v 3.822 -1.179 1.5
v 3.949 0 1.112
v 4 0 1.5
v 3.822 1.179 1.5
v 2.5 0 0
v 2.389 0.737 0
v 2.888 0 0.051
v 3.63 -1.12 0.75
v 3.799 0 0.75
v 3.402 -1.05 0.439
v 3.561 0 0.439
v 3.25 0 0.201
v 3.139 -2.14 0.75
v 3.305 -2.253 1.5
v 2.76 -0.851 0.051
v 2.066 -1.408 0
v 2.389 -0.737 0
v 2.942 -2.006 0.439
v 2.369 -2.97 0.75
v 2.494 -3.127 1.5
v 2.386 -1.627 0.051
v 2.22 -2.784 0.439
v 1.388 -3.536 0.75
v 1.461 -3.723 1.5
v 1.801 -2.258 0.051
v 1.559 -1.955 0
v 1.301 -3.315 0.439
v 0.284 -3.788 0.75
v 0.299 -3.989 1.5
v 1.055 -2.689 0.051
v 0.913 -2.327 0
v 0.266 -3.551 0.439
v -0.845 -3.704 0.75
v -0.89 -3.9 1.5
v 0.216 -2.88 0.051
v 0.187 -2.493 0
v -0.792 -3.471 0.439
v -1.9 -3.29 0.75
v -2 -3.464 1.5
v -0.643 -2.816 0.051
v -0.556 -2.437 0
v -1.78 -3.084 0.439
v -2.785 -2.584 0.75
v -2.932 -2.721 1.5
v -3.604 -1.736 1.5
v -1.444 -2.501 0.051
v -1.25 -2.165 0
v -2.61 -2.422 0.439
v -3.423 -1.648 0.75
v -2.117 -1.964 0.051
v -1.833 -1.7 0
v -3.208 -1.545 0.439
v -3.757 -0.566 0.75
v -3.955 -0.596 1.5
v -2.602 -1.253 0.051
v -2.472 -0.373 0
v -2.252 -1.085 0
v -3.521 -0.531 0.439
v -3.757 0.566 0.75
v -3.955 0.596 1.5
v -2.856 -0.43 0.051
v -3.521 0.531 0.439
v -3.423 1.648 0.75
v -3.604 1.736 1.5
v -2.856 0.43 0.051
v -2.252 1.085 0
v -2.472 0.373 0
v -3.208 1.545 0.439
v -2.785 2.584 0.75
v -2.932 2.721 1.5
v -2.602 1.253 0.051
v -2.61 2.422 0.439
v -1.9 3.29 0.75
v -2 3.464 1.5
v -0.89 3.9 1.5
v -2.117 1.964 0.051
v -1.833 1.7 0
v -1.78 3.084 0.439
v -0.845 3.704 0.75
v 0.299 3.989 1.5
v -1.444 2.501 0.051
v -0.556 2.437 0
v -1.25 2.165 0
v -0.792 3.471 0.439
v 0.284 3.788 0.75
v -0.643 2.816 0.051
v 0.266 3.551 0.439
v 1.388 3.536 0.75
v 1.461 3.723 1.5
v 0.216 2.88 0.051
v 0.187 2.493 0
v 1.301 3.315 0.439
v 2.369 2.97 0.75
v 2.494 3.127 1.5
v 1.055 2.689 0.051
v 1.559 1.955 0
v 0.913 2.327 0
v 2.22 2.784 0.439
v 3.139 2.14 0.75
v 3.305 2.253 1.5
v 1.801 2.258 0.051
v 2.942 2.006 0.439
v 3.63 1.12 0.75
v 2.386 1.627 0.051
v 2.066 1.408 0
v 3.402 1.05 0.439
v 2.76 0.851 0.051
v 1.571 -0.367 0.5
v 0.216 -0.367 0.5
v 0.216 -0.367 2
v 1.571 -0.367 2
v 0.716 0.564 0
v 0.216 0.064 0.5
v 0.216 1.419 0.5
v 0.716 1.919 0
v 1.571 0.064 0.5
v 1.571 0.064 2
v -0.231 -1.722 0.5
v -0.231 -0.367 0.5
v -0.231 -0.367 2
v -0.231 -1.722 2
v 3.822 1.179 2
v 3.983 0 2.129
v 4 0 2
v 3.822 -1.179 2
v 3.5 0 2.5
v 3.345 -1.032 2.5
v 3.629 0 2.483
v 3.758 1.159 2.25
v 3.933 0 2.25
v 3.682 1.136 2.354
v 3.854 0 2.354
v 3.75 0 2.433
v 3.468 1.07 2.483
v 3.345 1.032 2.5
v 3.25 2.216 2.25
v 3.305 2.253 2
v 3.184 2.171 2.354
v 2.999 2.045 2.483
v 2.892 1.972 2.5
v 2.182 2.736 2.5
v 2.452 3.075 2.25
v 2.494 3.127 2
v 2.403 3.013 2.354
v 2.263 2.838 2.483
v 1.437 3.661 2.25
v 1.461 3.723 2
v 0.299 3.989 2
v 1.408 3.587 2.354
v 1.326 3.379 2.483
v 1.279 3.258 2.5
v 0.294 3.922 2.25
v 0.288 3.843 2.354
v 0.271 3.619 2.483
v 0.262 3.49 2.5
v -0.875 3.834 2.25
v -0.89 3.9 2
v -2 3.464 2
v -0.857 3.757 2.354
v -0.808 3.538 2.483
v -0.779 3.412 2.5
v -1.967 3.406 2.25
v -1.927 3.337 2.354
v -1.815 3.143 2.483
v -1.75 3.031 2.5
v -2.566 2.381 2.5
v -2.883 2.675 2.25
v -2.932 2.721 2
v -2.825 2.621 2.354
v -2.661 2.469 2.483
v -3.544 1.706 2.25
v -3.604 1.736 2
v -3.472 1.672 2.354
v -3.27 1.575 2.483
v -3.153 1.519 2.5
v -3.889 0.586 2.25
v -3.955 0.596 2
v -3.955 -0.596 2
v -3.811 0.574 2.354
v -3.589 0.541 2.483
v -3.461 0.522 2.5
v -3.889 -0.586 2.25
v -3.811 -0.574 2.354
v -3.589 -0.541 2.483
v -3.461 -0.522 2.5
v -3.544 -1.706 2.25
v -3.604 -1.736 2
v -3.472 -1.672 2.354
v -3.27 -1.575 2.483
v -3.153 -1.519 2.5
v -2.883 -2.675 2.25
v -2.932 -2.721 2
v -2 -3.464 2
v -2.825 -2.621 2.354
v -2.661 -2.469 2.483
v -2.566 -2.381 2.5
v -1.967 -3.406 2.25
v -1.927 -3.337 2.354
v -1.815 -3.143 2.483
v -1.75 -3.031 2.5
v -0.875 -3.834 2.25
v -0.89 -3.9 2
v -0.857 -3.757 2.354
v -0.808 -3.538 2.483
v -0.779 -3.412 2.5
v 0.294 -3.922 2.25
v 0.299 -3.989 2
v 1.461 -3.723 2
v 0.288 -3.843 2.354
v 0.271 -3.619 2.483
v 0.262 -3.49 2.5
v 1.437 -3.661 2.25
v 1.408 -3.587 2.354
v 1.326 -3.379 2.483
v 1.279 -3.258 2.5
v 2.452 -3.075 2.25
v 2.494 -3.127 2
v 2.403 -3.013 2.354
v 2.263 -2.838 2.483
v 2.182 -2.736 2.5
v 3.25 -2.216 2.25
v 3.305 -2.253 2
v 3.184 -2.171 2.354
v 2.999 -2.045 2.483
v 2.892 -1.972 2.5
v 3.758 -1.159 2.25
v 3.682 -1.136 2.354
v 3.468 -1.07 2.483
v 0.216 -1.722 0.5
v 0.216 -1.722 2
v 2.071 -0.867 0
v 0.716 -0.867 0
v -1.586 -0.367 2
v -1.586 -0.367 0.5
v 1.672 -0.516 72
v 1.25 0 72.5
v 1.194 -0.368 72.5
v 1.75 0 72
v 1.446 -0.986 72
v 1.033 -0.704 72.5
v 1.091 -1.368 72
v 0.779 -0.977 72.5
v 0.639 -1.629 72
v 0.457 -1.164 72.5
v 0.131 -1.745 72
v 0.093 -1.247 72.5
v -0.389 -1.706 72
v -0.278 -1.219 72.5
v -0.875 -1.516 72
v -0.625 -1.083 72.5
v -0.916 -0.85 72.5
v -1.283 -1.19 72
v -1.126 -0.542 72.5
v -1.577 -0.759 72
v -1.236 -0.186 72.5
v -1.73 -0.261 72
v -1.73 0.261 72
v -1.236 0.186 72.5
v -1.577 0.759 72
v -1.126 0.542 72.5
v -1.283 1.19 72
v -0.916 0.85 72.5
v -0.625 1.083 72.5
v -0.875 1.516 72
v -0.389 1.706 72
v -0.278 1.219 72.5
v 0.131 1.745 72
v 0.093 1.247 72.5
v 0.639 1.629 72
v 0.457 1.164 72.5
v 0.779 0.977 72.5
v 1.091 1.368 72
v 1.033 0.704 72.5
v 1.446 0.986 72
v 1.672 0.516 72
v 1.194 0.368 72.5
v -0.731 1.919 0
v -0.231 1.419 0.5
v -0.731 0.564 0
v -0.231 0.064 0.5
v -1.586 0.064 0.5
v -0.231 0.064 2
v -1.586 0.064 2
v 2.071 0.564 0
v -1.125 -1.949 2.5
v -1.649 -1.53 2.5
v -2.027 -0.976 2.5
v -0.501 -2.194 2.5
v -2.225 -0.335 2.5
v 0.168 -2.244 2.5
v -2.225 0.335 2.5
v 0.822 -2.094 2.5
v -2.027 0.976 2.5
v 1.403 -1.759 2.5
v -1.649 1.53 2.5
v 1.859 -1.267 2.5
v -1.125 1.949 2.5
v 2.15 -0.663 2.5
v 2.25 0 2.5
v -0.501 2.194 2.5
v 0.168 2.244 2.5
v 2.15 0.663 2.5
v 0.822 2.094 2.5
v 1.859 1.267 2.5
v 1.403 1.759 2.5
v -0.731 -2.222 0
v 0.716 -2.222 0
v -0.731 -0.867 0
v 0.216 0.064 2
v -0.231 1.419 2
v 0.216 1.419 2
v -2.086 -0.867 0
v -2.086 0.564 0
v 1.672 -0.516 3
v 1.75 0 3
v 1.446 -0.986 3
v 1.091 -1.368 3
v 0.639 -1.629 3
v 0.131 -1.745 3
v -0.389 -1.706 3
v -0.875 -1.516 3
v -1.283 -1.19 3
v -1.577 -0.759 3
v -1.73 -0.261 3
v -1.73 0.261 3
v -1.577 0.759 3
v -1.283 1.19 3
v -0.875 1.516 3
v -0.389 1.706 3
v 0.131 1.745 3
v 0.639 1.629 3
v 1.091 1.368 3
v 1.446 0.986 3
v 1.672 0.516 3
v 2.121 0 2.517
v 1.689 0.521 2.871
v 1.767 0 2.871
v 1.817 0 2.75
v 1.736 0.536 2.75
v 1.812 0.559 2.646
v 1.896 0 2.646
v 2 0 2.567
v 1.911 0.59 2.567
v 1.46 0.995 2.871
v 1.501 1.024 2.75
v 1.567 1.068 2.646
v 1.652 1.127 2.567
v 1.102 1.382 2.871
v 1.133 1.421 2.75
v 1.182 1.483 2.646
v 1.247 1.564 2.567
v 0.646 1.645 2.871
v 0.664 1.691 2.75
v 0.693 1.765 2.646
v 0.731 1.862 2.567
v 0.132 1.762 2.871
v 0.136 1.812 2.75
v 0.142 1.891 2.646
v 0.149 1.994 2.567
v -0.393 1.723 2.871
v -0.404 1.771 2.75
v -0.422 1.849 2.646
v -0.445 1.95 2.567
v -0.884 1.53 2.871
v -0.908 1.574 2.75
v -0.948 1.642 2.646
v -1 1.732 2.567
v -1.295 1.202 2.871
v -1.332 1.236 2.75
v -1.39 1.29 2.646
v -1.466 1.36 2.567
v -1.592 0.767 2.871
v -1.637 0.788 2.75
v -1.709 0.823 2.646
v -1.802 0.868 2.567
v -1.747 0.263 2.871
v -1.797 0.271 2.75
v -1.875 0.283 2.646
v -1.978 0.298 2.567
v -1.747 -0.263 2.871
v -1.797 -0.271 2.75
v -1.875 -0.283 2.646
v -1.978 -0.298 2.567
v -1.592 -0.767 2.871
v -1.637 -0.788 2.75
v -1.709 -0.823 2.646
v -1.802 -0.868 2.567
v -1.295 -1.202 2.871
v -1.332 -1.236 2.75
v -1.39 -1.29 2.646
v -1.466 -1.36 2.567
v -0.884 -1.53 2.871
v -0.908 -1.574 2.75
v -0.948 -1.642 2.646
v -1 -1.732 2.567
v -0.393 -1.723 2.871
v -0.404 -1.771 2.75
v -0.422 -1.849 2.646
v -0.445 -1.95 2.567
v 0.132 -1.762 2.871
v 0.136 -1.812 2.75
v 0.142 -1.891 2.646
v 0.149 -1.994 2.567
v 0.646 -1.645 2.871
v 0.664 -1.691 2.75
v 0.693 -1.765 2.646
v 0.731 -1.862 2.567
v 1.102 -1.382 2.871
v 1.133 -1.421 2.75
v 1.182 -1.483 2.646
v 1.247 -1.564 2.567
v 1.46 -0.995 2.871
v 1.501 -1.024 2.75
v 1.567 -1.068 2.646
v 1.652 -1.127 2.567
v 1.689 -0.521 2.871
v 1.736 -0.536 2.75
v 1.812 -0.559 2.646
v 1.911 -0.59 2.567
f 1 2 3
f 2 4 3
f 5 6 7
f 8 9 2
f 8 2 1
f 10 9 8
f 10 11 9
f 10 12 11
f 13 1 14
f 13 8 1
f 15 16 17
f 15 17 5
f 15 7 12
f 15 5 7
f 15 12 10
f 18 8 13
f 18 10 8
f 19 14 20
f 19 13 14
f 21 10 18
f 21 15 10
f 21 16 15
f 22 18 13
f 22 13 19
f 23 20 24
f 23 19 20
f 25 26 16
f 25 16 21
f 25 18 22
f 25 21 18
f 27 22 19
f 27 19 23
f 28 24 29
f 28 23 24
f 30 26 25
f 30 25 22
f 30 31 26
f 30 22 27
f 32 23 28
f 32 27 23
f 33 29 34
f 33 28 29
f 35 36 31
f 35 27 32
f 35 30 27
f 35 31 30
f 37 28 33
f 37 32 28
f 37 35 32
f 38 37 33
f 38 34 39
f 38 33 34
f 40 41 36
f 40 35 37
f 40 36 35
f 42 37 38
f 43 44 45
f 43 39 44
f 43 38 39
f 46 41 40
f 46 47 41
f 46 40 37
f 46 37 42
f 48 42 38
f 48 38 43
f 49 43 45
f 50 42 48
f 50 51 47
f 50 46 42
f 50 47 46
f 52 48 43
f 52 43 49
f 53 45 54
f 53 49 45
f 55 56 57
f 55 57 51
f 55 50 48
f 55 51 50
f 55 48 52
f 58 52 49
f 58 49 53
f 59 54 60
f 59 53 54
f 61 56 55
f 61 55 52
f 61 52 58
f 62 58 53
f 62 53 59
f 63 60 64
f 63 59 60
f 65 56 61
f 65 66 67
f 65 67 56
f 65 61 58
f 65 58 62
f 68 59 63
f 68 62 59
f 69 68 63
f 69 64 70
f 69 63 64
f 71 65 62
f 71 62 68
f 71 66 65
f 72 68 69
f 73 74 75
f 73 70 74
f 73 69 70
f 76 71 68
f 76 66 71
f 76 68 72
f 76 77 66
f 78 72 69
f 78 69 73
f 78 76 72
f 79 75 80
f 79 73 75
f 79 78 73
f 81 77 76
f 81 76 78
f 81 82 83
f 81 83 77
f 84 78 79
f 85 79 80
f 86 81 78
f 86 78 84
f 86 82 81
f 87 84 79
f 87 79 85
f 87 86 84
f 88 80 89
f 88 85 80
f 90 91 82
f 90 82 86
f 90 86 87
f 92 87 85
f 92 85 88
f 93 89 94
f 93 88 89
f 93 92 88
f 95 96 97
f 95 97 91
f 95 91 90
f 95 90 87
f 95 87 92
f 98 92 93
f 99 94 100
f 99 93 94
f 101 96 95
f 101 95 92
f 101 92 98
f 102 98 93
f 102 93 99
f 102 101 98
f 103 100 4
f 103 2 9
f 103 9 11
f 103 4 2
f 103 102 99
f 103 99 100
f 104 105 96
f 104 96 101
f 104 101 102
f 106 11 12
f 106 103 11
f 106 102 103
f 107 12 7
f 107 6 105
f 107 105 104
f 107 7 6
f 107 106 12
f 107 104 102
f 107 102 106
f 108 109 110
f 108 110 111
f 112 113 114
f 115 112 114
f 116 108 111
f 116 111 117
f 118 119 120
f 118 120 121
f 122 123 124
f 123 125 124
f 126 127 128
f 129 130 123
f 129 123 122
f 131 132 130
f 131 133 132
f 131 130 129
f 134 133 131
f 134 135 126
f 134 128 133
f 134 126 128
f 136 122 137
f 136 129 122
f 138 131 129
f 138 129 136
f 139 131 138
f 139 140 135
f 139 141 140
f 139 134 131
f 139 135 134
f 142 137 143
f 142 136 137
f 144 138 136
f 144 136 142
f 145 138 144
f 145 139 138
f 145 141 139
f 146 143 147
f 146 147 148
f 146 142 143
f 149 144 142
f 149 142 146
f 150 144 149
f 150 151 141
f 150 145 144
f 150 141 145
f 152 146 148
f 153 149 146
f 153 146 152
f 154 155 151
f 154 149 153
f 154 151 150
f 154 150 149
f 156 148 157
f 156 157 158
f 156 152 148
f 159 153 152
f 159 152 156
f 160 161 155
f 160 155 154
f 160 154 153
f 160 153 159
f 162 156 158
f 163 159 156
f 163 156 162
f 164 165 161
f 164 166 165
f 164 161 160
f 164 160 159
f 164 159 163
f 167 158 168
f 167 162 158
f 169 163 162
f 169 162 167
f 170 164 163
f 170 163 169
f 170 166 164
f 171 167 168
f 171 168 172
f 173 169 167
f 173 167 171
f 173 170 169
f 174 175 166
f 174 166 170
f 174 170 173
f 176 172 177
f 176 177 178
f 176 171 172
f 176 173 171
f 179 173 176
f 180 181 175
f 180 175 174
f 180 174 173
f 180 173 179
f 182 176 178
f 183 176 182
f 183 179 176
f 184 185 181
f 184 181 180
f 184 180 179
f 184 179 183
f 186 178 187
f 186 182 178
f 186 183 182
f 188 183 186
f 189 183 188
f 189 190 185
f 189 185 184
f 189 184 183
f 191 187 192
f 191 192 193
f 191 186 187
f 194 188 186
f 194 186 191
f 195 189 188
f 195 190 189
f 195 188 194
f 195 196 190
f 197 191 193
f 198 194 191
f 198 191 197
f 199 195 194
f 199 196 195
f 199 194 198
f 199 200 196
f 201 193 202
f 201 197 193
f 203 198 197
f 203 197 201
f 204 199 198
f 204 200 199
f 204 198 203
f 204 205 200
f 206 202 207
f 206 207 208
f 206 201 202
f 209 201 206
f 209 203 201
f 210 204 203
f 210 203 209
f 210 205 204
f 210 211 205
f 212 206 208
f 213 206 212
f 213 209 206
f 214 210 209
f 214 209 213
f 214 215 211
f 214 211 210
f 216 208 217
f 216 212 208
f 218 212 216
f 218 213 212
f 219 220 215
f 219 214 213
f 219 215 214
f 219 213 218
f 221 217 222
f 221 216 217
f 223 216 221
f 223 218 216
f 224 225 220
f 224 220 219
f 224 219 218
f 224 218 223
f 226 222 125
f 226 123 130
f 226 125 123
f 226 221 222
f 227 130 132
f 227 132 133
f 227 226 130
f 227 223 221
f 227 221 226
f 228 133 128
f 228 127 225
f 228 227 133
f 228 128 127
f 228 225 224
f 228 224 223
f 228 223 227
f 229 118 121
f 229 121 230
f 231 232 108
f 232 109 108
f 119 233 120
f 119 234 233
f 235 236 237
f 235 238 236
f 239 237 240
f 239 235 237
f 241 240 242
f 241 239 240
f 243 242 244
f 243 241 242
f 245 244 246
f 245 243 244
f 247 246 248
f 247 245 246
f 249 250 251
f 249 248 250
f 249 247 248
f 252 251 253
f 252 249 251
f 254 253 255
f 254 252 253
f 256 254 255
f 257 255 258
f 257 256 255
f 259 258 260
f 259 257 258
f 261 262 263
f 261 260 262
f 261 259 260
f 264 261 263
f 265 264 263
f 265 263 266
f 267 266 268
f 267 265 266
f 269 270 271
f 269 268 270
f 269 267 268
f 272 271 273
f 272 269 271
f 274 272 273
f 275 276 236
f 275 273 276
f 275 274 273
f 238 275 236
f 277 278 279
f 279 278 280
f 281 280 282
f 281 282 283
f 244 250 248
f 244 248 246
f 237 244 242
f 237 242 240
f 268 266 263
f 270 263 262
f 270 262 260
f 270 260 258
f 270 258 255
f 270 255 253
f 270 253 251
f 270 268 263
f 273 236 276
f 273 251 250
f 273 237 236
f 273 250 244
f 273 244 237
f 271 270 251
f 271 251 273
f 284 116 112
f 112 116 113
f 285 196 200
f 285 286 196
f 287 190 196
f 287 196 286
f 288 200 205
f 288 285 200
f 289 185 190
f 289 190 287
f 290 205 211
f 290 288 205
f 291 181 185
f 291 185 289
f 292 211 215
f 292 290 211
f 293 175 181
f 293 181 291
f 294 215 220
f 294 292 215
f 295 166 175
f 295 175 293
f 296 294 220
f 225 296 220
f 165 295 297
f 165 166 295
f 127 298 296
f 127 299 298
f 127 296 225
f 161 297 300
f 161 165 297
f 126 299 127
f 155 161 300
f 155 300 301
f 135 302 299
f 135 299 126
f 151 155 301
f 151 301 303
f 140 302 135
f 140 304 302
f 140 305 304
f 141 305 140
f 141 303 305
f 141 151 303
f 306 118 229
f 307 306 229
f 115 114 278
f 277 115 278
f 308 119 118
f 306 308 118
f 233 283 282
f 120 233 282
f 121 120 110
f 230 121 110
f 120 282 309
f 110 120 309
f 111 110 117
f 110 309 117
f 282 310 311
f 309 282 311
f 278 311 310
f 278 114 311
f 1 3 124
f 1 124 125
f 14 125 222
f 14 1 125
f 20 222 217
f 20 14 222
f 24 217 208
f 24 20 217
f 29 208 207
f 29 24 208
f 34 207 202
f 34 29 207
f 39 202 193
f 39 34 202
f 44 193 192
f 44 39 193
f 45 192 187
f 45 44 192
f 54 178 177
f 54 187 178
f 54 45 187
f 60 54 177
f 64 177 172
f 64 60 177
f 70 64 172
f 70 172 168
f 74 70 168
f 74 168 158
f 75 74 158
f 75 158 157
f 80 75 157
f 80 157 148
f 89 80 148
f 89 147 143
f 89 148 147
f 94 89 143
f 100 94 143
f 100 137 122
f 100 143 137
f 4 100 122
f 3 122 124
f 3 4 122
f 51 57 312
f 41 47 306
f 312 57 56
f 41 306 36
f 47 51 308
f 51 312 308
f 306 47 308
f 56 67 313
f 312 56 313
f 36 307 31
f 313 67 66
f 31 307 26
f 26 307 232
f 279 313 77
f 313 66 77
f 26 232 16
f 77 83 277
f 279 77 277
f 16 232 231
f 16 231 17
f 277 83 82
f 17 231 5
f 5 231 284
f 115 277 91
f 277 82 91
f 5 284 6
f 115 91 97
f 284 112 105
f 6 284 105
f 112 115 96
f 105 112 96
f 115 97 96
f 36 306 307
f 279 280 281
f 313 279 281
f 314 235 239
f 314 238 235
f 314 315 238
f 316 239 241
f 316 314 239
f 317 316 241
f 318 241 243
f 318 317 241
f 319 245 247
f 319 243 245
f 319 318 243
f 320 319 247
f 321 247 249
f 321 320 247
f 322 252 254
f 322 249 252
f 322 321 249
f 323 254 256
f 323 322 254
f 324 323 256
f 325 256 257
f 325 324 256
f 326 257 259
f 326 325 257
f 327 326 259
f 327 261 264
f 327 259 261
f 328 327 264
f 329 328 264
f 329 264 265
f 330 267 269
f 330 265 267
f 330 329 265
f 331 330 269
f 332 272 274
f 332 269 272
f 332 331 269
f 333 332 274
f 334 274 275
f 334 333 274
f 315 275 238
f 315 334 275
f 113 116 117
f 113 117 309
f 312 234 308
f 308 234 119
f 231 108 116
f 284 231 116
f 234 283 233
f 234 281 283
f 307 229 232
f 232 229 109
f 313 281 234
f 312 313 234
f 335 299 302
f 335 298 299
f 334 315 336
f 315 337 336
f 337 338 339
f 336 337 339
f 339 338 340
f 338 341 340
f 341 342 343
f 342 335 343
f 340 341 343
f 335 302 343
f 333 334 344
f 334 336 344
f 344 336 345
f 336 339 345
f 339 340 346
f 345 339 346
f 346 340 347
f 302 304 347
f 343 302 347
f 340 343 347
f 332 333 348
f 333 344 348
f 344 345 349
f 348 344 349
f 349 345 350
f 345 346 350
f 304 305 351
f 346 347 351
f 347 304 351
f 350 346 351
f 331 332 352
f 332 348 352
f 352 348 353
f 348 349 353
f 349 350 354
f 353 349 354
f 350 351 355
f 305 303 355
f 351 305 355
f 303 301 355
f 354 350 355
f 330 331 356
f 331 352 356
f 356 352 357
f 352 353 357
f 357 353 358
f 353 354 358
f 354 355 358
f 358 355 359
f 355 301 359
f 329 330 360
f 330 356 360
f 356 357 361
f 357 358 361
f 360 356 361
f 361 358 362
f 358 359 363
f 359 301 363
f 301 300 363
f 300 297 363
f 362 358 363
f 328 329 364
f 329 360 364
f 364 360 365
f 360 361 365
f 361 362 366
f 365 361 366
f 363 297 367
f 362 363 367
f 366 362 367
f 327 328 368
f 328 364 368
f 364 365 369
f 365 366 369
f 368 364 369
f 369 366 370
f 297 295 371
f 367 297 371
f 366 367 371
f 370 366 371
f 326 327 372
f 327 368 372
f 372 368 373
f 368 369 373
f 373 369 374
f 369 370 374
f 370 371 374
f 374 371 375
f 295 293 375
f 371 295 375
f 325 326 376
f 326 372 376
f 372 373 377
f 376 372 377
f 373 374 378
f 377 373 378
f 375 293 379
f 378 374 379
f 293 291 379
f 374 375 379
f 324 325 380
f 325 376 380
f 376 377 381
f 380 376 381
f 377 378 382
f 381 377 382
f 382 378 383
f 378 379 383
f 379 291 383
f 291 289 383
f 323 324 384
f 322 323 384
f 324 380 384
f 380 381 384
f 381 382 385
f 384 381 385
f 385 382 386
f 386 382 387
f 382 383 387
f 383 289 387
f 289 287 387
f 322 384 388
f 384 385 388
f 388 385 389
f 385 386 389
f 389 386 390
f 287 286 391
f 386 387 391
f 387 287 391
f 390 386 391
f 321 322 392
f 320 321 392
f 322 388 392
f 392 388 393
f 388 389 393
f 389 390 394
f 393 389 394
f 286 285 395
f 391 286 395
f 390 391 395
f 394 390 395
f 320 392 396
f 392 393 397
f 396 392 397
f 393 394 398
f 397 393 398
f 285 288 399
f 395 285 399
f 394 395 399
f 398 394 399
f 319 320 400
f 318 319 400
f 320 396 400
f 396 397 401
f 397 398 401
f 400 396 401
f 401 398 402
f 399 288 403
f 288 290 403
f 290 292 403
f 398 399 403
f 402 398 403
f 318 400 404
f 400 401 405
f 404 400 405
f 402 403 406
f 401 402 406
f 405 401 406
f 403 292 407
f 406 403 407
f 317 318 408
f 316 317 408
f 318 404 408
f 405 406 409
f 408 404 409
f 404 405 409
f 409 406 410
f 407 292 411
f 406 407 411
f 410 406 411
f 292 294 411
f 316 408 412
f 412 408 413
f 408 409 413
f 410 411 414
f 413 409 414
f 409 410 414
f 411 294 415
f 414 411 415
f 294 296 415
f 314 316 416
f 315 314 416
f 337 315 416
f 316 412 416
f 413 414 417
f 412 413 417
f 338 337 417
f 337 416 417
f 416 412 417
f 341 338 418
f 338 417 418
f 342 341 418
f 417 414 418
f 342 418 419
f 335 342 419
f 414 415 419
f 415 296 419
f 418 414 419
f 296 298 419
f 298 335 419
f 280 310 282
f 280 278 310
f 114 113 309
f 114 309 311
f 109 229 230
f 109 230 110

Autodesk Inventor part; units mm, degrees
ref_plane "YZ Plane" through (0, 0, 0) normal (1, 0, 0) x (0, 1, 0)
ref_plane "XZ Plane" through (0, 0, 0) normal (0, 1, 0) x (-1, 0, 0)
ref_plane "XY Plane" through (0, 0, 0) normal (0, 0, 1) x (1, 0, 0)
sketch "Sketch1" plane through (0, 0, 0) normal (0, 0, 1) x (1, 0, 0)
  circle A0 centre (0, 0) radius 4
  dimension "d0" = 8
extrude "Extrusion1" add sketch "Sketch1" along normal blind 2.5
sketch "Sketch2" plane through (0, 0, 2.5) normal (0, 0, 1) x (1, 0, 0)
  circle A0 centre (0, 0) radius 1.75
  dimension "d3" = 3.5
extrude "Extrusion2" add sketch "Sketch2" along normal blind 70
thread "Thread1" size "M3.5x0.6" class "6g" standard "ANSI Metric M Profile" length 45 offset 25
chamfer "Chamfer1" distance 0.5 angle 45 1 edges at (-1.75, 0, 72.5)
fillet "Fillet1" radius 0.5 1 edges at (-1.75, 0, 2.5)
fillet "Fillet2" radius 1.5 1 edges at (-4, 0, 0)
sketch "Sketch3" plane through (0, 0, 0) normal (0, 0, -1) x (-1, 0, 0)
  line L0 (-1.9955, 1.419) -> (0.9534, 1.419) construction
  line L1 (0.9534, 1.419) -> (0.9534, -1.1751) construction
  line L2 (0.9534, -1.1751) -> (-1.9955, -1.1751) construction
  line L3 (-1.9955, -1.1751) -> (-1.9955, 1.419) construction
  line L4 (1.5864, -0.3671) -> (0.2314, -0.3671)
  line L5 (0.2314, -0.3671) -> (0.2314, -1.722)
  line L6 (0.2314, -1.722) -> (-0.2159, -1.722)
  line L7 (-0.2159, -1.722) -> (-0.2159, -0.3671)
  line L8 (-0.2159, -0.3671) -> (-1.5708, -0.3671)
  line L9 (-1.5708, -0.3671) -> (-1.5708, 0.064)
  line L10 (-1.5708, 0.064) -> (-0.2159, 0.064)
  line L11 (-0.2159, 0.064) -> (-0.2159, 1.419)
  line L12 (-0.2159, 1.419) -> (0.2314, 1.419)
  line L13 (0.2314, 1.419) -> (0.2314, 0.064)
  line L14 (0.2314, 0.064) -> (1.5864, 0.064)
  line L15 (1.5864, 0.064) -> (1.5864, -0.3671)
  point P0 (0, 0)
emboss "Emboss1" sketch "Sketch3" operation cut depth 2 direction (0, 0, 1)
chamfer "Chamfer2" distance 0.5 angle 45 12 edges at (-1.5864, -0.1515, 0) (-0.9089, -0.3671, 0) (-0.2314, -1.0445, 0) (-0.0078, -1.722, 0) (0.2159, -1.0445, 0) (0.8934, -0.3671, 0) (1.5708, -0.1515, 0) (0.8934, 0.064, 0) (0.2159, 0.7415, 0) (-0.0078, 1.419, 0) (-0.2314, 0.7415, 0) (-0.9089, 0.064, 0)
fillet "Fillet3" radius 0.5 1 edges at (-4, 0, 2.5)
properties part number "screw" material "Aluminum"
